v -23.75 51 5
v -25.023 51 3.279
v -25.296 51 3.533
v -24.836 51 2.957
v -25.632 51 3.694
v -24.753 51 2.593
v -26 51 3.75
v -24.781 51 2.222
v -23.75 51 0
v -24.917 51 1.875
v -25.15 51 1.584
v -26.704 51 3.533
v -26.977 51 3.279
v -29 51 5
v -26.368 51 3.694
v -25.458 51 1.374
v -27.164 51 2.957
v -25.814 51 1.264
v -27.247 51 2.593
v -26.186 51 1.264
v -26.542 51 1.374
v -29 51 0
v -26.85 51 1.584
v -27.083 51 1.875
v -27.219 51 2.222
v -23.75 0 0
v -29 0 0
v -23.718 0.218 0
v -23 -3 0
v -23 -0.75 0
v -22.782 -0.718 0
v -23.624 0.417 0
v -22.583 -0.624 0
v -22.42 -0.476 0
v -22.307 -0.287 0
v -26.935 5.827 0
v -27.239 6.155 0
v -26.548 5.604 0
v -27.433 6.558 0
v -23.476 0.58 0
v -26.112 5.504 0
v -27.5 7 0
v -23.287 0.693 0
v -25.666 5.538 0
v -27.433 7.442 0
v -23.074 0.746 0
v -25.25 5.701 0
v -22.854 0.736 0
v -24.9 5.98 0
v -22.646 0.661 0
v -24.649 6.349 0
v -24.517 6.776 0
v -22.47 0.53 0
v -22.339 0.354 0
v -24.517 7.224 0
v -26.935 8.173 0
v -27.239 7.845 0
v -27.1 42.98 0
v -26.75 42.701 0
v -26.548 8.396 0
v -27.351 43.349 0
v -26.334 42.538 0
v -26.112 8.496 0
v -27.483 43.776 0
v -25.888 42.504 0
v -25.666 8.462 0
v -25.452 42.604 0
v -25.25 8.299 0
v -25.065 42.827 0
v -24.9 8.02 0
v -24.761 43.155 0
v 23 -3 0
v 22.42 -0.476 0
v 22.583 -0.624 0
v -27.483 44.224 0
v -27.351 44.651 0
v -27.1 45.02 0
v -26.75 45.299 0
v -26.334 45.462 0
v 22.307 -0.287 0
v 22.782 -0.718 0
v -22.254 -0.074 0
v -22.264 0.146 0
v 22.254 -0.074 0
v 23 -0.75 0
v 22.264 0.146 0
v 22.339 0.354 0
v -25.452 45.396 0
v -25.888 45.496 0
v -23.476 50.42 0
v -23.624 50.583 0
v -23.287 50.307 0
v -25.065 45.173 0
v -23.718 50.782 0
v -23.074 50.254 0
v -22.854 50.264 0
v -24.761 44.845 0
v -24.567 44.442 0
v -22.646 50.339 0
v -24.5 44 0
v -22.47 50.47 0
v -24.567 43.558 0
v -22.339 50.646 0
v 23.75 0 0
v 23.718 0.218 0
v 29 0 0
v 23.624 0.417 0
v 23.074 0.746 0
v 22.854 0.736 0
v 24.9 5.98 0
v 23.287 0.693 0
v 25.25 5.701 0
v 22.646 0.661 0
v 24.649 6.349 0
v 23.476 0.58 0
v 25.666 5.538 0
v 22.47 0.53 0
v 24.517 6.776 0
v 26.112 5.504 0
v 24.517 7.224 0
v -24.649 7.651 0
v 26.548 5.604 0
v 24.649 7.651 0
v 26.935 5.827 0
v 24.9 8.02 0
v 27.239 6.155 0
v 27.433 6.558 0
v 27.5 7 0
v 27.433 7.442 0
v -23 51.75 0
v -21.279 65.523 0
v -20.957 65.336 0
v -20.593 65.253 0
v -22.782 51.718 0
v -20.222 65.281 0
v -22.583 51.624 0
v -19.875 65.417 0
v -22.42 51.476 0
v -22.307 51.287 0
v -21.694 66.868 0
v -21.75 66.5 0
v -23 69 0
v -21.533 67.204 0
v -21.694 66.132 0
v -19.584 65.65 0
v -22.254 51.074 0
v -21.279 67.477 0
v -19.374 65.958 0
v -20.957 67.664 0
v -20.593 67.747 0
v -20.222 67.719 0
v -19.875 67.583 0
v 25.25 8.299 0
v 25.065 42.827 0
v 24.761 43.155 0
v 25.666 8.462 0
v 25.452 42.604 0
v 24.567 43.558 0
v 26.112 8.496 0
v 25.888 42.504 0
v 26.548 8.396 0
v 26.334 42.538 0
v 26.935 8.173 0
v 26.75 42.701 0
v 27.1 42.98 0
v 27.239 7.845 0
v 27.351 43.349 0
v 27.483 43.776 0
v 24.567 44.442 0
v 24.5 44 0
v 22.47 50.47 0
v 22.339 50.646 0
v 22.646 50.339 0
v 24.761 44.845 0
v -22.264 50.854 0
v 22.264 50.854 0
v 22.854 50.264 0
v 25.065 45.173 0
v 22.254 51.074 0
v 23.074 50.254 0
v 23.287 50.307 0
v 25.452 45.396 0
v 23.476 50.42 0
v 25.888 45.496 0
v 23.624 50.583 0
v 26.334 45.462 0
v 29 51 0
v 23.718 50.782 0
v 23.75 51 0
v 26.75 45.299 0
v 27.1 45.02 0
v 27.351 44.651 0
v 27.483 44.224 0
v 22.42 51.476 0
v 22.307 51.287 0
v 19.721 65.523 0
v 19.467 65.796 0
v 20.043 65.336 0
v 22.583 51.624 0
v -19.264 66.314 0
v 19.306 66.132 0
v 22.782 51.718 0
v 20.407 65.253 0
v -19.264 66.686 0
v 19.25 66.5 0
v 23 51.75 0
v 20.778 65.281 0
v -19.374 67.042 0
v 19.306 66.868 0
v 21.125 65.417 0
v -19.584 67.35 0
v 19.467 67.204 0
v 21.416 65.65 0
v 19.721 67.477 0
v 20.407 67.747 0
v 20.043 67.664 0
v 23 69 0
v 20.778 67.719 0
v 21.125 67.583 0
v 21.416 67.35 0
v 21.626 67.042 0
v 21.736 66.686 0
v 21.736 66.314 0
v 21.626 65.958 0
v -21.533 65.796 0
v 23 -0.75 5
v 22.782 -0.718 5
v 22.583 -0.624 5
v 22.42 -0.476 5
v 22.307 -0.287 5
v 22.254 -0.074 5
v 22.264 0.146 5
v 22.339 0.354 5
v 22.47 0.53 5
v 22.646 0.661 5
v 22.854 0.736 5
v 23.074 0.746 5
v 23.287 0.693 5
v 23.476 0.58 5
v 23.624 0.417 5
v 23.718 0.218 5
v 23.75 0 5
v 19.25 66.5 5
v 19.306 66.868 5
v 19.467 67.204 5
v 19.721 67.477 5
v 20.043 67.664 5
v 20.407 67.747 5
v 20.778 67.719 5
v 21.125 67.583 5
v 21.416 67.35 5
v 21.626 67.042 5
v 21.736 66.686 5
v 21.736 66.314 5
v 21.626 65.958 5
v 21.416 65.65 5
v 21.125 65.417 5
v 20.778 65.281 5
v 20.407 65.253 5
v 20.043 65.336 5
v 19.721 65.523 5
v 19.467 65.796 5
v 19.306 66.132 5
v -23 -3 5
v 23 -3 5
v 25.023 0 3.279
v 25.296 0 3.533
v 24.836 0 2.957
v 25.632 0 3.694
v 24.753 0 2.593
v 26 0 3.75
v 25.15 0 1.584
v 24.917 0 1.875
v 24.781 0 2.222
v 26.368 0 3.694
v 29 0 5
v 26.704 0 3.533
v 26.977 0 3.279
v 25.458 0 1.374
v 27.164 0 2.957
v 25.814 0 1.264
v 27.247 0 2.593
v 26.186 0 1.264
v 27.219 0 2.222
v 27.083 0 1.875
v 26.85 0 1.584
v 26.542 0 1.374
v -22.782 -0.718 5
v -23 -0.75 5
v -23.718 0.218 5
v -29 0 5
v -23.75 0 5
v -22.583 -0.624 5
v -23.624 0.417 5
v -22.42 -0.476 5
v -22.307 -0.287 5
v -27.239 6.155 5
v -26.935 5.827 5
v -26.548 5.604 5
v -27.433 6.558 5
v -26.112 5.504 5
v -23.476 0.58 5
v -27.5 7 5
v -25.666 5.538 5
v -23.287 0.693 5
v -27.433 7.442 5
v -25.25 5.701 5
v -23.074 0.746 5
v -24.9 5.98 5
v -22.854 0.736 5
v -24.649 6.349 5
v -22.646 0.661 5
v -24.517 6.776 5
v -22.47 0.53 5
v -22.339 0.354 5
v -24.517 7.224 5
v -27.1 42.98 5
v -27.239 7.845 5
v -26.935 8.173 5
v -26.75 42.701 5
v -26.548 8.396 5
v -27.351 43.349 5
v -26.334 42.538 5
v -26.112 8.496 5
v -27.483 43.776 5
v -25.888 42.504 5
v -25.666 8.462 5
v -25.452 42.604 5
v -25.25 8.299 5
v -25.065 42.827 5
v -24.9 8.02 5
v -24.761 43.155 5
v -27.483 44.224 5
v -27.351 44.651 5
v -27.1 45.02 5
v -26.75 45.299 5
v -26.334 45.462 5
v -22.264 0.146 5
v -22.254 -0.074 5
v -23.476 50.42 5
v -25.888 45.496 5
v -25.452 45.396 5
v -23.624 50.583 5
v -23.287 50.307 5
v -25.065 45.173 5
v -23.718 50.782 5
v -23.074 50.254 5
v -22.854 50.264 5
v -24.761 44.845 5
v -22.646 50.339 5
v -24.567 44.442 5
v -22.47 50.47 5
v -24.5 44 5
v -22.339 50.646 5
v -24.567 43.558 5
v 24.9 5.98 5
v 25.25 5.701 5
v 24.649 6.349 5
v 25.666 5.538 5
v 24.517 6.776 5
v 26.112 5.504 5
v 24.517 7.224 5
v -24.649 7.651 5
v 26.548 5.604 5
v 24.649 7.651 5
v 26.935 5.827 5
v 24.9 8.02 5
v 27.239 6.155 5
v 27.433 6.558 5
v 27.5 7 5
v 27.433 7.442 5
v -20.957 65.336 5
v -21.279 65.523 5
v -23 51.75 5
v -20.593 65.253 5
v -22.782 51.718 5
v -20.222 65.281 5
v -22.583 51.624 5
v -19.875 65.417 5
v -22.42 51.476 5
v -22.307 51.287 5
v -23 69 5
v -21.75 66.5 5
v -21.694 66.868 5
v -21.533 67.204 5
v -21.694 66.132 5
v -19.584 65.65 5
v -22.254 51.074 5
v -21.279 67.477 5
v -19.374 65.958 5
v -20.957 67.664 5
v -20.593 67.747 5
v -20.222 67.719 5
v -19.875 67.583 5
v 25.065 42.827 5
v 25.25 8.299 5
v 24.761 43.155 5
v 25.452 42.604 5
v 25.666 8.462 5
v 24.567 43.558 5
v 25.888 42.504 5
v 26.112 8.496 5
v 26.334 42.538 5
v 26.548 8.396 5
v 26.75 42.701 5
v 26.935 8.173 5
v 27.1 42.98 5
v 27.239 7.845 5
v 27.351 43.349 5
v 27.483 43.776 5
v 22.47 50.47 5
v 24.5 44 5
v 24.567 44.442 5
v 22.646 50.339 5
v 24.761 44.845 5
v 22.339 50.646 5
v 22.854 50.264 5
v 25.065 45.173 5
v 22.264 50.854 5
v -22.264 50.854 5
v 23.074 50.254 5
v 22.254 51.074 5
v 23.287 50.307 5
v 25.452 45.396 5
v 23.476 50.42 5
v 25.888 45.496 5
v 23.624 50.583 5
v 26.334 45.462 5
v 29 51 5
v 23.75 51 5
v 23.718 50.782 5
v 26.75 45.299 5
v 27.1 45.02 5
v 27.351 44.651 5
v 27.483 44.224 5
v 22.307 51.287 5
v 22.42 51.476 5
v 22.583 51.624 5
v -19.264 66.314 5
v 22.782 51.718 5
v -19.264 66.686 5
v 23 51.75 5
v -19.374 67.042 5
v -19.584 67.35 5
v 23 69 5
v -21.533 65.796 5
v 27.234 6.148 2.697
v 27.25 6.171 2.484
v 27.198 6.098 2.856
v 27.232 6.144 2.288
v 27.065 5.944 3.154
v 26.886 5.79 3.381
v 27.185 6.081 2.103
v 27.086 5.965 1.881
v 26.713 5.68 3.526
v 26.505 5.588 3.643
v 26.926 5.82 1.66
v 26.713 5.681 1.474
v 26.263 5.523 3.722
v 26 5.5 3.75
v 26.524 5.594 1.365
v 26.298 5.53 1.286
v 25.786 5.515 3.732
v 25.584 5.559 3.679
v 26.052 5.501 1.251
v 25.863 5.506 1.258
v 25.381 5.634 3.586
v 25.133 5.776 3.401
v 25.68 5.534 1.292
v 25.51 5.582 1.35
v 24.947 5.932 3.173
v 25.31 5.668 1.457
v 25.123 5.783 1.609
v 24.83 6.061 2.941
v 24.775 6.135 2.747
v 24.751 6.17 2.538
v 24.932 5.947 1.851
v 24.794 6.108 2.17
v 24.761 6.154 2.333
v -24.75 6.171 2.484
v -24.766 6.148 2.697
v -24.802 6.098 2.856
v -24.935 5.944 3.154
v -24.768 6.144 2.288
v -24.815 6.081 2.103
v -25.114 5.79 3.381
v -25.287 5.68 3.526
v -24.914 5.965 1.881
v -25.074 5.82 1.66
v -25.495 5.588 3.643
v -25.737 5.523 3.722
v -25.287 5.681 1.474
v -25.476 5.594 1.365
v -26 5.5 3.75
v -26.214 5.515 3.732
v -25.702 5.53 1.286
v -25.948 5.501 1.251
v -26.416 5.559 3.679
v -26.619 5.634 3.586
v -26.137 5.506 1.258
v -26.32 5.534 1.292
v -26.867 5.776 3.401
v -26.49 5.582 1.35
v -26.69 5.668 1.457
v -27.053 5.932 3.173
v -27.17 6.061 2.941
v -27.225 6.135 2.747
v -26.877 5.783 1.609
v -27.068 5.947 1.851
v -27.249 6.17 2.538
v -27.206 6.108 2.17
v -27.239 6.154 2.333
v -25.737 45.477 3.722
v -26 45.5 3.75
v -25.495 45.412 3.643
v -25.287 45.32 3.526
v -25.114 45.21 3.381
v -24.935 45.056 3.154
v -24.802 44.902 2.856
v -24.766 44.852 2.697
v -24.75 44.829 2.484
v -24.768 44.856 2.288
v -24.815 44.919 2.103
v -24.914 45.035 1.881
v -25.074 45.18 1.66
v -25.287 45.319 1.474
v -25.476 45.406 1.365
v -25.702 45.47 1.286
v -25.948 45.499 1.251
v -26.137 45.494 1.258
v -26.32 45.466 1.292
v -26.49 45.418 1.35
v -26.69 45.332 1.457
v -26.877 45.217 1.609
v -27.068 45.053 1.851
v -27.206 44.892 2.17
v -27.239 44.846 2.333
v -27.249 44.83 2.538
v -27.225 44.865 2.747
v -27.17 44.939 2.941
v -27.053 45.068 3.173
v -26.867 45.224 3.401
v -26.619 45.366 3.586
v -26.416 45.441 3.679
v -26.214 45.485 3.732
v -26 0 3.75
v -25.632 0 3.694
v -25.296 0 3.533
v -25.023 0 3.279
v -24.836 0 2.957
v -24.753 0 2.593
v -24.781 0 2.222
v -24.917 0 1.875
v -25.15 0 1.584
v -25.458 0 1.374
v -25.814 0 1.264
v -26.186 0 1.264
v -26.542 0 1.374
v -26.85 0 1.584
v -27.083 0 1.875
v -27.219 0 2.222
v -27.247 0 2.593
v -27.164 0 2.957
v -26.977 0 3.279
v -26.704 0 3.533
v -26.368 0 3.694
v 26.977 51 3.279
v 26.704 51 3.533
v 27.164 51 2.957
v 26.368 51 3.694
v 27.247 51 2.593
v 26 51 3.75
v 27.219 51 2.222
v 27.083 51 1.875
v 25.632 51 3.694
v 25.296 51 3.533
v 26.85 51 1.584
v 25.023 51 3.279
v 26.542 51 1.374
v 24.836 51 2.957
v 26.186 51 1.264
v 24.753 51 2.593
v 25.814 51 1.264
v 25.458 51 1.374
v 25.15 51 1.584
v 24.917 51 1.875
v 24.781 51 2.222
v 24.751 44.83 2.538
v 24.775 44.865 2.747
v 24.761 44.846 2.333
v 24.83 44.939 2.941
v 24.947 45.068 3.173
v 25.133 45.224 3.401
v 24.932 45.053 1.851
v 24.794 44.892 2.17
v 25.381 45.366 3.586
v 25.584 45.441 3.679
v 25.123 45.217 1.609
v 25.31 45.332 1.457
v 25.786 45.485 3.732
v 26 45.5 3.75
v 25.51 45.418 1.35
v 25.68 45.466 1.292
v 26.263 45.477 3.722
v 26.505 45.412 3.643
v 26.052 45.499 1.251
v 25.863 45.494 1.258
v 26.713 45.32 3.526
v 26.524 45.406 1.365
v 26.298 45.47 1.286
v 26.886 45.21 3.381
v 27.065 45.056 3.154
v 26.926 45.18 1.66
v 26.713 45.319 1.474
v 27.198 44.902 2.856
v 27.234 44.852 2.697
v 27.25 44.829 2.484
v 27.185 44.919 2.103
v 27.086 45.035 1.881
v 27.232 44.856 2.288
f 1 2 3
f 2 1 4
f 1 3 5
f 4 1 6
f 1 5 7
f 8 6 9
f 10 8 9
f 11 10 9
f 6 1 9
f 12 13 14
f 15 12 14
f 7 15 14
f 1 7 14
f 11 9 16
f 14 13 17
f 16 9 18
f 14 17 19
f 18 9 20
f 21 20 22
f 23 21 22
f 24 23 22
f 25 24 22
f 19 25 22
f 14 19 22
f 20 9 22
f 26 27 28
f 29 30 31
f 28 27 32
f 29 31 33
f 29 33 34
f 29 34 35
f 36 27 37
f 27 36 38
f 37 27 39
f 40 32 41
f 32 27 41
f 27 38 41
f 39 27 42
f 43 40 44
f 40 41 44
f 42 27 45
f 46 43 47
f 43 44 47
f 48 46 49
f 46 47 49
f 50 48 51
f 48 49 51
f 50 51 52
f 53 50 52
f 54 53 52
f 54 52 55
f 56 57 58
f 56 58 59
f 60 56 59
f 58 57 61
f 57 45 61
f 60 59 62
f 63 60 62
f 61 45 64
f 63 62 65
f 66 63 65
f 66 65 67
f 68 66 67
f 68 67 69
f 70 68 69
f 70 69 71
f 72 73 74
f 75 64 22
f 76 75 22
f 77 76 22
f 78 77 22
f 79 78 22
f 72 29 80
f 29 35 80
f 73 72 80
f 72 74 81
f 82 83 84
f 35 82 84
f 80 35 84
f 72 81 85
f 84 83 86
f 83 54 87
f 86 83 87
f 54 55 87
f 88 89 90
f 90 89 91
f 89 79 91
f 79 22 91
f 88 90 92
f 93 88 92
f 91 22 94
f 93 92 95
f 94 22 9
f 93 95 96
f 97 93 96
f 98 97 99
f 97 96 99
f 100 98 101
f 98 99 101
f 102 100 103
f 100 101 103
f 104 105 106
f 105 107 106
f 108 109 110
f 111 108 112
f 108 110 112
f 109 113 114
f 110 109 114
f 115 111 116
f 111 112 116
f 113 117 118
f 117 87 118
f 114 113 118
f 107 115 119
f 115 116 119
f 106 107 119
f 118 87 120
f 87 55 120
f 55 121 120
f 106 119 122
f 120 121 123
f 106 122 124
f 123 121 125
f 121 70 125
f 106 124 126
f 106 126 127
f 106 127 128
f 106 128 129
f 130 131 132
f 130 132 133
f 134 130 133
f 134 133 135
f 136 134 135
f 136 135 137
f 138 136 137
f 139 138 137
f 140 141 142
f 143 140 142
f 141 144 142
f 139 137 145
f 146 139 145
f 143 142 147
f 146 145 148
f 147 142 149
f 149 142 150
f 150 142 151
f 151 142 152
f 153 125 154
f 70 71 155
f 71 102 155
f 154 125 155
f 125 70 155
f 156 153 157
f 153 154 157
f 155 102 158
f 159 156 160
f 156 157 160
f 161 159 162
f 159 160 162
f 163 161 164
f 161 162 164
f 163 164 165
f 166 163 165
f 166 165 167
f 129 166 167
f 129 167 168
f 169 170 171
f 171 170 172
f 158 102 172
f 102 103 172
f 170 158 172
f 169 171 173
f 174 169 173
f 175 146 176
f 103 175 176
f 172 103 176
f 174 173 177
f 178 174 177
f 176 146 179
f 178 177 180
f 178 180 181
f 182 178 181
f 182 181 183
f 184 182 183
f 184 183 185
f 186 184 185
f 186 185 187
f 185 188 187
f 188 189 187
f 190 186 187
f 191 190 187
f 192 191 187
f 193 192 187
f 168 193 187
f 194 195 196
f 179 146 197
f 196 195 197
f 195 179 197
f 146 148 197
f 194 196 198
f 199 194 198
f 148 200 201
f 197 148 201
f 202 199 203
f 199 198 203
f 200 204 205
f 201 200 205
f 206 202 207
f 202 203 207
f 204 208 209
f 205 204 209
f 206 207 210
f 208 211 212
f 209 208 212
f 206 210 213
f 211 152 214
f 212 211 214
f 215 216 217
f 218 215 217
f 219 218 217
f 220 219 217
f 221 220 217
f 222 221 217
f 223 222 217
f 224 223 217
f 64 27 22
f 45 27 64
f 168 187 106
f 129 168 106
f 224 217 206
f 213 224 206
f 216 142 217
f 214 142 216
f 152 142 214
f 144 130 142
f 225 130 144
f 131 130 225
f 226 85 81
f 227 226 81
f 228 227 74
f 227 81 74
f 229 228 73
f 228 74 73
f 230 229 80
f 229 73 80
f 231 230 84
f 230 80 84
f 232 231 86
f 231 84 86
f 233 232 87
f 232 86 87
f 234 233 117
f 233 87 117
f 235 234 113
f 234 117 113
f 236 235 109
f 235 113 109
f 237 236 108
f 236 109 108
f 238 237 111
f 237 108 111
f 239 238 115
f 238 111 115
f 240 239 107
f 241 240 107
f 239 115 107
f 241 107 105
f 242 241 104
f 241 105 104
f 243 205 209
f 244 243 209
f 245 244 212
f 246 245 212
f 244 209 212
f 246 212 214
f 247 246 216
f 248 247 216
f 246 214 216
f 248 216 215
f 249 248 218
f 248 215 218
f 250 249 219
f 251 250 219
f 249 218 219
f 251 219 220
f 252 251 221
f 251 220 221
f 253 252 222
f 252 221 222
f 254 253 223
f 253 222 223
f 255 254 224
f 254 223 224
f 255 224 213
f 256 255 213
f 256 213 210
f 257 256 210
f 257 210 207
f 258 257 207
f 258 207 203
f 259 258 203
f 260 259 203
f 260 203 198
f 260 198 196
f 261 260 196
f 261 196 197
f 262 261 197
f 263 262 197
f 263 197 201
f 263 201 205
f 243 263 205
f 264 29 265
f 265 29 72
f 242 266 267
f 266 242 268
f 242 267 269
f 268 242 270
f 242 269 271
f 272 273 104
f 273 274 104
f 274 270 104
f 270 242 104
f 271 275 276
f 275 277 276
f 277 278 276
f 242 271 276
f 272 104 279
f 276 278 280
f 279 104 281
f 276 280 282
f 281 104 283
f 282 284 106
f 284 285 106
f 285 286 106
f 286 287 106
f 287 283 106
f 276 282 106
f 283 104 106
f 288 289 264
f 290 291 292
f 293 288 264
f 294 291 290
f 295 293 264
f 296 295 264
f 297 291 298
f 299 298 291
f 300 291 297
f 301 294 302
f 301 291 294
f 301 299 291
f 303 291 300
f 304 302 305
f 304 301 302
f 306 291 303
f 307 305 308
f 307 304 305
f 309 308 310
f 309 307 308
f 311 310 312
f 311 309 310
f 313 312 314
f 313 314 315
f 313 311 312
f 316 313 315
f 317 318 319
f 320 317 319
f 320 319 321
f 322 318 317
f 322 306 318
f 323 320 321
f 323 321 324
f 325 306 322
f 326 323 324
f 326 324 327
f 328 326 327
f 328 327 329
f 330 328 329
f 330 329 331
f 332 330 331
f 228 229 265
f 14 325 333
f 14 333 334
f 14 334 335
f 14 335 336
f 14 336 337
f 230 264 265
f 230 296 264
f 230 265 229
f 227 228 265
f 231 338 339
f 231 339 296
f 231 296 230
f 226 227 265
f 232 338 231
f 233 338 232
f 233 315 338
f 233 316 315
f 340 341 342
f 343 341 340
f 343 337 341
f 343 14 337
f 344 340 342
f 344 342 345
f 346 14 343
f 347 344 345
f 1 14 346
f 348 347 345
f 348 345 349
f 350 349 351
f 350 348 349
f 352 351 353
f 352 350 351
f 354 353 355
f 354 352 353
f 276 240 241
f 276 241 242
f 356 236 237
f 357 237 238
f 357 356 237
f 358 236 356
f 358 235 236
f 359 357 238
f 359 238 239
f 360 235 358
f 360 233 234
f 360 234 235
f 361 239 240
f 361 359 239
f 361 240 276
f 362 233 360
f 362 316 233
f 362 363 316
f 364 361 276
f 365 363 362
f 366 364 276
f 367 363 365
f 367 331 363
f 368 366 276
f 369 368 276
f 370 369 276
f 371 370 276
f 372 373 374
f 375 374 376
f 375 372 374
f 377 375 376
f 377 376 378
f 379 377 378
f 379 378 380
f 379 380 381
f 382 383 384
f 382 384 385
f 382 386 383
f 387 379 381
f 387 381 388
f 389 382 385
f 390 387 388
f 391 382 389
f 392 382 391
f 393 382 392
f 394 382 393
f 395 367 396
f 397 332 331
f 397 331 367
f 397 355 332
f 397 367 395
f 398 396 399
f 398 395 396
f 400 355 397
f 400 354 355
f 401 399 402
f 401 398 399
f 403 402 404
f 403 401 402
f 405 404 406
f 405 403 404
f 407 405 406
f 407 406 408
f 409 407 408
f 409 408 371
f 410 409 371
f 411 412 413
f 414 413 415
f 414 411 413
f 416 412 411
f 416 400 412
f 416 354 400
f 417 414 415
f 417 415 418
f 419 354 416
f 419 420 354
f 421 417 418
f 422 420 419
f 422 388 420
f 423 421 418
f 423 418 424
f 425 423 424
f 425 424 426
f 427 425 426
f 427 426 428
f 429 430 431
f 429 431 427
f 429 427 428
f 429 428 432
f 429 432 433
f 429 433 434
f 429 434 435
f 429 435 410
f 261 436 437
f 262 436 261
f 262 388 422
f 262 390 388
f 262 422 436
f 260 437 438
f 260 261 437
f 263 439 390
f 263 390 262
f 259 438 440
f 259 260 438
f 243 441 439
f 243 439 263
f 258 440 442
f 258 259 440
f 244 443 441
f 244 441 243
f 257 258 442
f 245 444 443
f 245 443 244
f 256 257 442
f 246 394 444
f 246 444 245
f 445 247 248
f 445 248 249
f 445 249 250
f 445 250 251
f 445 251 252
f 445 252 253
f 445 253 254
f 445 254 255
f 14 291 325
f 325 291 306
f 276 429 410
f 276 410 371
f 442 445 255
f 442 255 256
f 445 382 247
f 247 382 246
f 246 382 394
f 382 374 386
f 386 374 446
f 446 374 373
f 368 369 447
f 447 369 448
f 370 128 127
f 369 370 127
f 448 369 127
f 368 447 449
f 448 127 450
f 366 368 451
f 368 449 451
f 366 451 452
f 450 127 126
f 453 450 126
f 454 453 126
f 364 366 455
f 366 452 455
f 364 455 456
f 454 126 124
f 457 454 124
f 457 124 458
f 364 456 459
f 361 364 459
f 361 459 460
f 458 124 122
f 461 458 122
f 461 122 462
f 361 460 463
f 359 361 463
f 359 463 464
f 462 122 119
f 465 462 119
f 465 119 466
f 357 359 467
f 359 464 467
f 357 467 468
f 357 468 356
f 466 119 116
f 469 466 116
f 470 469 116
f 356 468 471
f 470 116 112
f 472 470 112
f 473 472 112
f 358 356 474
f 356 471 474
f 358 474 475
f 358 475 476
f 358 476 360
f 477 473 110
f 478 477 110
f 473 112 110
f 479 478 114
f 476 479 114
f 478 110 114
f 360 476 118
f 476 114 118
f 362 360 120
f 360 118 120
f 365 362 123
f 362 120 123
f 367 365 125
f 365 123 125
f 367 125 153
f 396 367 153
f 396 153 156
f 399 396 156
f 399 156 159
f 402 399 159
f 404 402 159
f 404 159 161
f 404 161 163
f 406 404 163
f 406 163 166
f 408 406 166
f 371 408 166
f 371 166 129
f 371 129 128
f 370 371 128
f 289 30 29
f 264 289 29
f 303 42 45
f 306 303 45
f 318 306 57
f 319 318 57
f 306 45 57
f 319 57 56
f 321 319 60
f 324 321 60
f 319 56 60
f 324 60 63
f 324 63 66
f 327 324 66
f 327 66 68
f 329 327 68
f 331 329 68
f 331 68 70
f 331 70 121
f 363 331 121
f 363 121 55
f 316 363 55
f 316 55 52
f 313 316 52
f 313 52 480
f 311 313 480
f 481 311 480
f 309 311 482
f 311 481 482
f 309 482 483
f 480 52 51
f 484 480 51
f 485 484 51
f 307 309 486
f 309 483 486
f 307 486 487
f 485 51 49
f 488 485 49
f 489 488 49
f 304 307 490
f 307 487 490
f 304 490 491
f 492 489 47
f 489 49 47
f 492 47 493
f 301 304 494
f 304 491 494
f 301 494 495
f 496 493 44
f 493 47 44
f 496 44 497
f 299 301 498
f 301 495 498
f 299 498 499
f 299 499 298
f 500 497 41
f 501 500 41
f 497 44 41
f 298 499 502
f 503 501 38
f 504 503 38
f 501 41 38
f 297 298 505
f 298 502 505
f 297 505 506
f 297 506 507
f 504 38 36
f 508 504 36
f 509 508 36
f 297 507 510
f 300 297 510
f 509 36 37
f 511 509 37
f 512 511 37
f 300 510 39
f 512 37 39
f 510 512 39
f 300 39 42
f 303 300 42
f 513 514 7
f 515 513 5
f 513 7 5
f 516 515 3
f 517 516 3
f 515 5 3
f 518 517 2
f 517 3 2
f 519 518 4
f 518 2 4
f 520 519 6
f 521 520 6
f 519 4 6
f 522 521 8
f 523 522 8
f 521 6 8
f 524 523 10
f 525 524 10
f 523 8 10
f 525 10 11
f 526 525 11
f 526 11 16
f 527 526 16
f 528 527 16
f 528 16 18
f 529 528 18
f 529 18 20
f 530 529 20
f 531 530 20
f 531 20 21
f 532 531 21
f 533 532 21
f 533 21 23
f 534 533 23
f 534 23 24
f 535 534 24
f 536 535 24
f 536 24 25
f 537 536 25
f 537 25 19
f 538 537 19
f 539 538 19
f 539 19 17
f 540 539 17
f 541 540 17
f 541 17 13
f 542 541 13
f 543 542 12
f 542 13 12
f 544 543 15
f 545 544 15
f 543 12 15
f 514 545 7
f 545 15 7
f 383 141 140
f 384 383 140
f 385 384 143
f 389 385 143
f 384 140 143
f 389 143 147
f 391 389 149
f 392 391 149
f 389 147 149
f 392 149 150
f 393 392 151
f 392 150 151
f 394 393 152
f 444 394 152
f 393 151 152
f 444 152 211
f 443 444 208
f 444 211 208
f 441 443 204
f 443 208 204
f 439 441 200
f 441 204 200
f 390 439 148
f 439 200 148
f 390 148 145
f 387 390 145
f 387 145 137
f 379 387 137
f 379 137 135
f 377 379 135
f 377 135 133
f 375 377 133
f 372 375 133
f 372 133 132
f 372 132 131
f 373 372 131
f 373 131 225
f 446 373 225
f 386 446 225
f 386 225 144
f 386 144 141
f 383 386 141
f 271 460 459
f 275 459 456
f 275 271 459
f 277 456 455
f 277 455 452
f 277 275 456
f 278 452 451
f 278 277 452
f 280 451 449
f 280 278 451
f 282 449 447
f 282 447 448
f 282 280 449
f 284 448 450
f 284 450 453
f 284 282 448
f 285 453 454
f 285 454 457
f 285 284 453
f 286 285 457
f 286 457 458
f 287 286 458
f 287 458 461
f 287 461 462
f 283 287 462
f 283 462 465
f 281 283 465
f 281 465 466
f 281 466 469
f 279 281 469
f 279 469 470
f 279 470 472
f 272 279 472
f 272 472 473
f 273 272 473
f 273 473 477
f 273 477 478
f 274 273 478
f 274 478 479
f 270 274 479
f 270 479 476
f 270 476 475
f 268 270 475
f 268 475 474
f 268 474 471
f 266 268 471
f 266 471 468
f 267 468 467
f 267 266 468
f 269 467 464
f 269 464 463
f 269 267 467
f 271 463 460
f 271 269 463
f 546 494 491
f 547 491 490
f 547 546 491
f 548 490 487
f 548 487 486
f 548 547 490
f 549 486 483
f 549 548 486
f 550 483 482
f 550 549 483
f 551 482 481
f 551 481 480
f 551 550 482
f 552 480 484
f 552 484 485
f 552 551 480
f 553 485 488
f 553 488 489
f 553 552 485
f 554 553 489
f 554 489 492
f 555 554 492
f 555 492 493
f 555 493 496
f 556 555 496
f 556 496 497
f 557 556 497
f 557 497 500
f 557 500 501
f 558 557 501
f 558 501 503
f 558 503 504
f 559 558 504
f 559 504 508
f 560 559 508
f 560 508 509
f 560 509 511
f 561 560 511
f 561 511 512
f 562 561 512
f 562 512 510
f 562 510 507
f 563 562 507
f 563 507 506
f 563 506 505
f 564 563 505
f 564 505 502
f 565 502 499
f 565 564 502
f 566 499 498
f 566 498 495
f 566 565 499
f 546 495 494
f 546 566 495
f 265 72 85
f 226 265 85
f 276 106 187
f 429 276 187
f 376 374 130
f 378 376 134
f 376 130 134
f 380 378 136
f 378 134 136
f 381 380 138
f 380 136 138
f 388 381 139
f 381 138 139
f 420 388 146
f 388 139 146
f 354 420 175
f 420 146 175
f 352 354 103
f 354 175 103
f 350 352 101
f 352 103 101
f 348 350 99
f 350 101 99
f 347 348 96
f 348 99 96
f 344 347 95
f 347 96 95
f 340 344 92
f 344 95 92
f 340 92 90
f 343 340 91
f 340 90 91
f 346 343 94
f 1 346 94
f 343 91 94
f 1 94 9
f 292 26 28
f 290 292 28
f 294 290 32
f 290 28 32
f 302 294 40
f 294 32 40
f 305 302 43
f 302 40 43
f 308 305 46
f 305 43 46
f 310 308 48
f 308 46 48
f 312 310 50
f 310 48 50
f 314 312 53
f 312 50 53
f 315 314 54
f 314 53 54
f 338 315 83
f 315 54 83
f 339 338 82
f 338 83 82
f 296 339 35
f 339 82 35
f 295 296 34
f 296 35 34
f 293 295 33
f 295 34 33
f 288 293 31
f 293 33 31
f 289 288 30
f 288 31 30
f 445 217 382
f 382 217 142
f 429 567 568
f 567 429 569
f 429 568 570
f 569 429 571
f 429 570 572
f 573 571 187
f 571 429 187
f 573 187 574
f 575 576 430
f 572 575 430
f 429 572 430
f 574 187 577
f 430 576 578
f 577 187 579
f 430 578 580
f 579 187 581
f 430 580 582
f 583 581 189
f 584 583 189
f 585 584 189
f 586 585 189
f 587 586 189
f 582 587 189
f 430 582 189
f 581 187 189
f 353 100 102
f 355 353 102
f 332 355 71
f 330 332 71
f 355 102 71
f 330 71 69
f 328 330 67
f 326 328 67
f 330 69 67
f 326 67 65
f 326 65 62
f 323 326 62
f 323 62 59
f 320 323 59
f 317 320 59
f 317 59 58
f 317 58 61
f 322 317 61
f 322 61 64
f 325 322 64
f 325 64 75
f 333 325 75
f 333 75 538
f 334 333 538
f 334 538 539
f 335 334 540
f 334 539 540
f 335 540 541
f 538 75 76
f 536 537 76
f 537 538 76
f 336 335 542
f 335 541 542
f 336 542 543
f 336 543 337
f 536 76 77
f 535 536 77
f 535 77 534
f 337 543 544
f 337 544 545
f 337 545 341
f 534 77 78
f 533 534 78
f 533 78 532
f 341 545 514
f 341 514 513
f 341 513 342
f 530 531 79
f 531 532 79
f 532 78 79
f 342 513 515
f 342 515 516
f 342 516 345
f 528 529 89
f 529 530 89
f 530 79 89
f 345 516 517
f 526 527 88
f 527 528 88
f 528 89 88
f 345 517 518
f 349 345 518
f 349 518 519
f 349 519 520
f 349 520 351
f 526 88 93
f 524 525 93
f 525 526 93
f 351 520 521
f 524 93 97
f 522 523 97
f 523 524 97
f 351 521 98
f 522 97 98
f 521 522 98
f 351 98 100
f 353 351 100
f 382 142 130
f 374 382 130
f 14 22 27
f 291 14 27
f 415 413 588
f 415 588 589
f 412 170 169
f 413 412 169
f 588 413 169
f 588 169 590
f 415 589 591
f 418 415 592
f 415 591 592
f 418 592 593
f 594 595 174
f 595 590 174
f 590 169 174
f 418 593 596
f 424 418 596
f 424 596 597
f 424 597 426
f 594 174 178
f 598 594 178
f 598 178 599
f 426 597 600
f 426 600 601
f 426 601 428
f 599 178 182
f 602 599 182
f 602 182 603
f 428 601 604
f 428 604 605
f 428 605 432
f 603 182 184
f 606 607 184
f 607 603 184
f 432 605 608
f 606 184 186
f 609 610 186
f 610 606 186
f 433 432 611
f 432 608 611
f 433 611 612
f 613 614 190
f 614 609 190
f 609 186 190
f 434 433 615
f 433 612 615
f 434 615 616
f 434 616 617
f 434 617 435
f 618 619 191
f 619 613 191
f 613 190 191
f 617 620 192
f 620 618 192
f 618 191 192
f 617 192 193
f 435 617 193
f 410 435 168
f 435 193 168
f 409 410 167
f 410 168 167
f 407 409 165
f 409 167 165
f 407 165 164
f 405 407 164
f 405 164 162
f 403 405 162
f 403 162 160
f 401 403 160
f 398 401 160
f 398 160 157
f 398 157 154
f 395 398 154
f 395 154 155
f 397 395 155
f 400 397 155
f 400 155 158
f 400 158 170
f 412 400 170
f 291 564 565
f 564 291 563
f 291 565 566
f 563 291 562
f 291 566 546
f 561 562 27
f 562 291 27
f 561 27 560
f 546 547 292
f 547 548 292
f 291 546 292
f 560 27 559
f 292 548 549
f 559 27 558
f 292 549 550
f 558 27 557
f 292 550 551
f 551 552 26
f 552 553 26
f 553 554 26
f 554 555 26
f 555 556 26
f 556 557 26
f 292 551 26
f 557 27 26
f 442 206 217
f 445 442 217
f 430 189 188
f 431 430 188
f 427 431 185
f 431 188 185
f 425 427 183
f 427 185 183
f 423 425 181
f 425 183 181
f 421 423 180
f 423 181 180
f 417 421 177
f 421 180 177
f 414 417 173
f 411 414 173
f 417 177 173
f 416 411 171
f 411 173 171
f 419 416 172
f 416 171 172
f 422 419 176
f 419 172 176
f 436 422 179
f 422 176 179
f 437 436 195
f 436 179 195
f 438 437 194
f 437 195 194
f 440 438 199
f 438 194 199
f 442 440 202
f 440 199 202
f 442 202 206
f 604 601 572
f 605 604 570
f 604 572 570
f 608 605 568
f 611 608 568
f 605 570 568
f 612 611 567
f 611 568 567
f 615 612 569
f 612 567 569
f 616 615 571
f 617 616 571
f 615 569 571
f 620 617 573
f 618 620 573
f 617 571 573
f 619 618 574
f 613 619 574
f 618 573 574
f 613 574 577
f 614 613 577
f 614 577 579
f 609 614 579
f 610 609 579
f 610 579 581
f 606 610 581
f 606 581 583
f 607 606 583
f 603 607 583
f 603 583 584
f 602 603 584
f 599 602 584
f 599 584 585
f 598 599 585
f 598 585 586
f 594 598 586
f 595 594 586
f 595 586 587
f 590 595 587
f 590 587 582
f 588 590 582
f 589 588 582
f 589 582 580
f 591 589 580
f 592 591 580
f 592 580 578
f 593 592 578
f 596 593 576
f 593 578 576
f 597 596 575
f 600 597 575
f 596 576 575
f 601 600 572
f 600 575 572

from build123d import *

# Parameters (mm, degrees)
EXTRUDE_1_DEPTH     = 5
SKETCH_3_R          = 1.25
CUT_EXTRUDE_2_DEPTH = 7.5
SKETCH_4_R          = 1.25
CUT_EXTRUDE_3_DEPTH = 76.013332148
SKETCH_5_R          = 0.75
CUT_EXTRUDE_4_DEPTH = 76.013332148
SKETCH_6_R          = 1.5
CUT_EXTRUDE_5_DEPTH = 76.013332148


with BuildPart() as part:
    # ｽｹｯﾁ1 → ﾎﾞｽ - 押し出し1 (new body)
    with BuildSketch(Plane.XY):
        Polygon((-29, 51), (-29, 0), (-23, 0), (-23, -3), (23, -3), (23, 0), (29, 0), (29, 51), (23, 51), (23, 69), (-23, 69), (-23, 51), align=None)
    extrude(amount=EXTRUDE_1_DEPTH)

    # ｽｹｯﾁ3 → ｶｯﾄ - 押し出し2 (cut)
    with BuildSketch(Plane(origin=(0, 51, 0), x_dir=(1, 0, 0), z_dir=(0, 1, 0))):
        with Locations(Location((-26, -2.5, 0), (0, 0, 270))):
            Circle(SKETCH_3_R)
        with Locations(Location((26, -2.5, 0), (0, 0, 270))):
            Circle(SKETCH_3_R)
    cut_extrude_2 = extrude(amount=-CUT_EXTRUDE_2_DEPTH, mode=Mode.SUBTRACT)

    # ﾐﾗｰ1: ｶｯﾄ - 押し出し2 across plane
    add(cut_extrude_2.mirror(Plane.ZX.offset(25.5)), mode=Mode.SUBTRACT)

    # ｽｹｯﾁ4 → ｶｯﾄ - 押し出し3 (cut, through all)
    with BuildSketch(Plane(origin=(0, 0, 0), x_dir=(-1, 0, 0), z_dir=(0, 0, -1))):
        with Locations((-20.5, 66.5)):
            Circle(SKETCH_4_R)
        with Locations((20.5, 66.5)):
            Circle(SKETCH_4_R)
    extrude(amount=-CUT_EXTRUDE_3_DEPTH, mode=Mode.SUBTRACT)

    # ｽｹｯﾁ5 → ｶｯﾄ - 押し出し4 (cut, through all)
    with BuildSketch(Plane(origin=(0, 0, 0), x_dir=(-1, 0, 0), z_dir=(0, 0, -1))):
        with Locations((-23, 0)):
            Circle(SKETCH_5_R)
        with Locations((23, 0)):
            Circle(SKETCH_5_R)
        with Locations((-23, 51)):
            Circle(SKETCH_5_R)
        with Locations((23, 51)):
            Circle(SKETCH_5_R)
    extrude(amount=-CUT_EXTRUDE_4_DEPTH, mode=Mode.SUBTRACT)

    # ｽｹｯﾁ6 → ｶｯﾄ - 押し出し5 (cut, through all)
    with BuildSketch(Plane(origin=(0, 0, 0), x_dir=(-1, 0, 0), z_dir=(0, 0, -1))):
        with Locations((-26, 44)):
            Circle(SKETCH_6_R)
        with Locations(Location((-26, 7, 0), (0, 0, 180))):
            Circle(SKETCH_6_R)
        with Locations((26, 7)):
            Circle(SKETCH_6_R)
        with Locations(Location((26, 44, 0), (0, 0, 180))):
            Circle(SKETCH_6_R)
    extrude(amount=-CUT_EXTRUDE_5_DEPTH, mode=Mode.SUBTRACT)


solid = part.part
